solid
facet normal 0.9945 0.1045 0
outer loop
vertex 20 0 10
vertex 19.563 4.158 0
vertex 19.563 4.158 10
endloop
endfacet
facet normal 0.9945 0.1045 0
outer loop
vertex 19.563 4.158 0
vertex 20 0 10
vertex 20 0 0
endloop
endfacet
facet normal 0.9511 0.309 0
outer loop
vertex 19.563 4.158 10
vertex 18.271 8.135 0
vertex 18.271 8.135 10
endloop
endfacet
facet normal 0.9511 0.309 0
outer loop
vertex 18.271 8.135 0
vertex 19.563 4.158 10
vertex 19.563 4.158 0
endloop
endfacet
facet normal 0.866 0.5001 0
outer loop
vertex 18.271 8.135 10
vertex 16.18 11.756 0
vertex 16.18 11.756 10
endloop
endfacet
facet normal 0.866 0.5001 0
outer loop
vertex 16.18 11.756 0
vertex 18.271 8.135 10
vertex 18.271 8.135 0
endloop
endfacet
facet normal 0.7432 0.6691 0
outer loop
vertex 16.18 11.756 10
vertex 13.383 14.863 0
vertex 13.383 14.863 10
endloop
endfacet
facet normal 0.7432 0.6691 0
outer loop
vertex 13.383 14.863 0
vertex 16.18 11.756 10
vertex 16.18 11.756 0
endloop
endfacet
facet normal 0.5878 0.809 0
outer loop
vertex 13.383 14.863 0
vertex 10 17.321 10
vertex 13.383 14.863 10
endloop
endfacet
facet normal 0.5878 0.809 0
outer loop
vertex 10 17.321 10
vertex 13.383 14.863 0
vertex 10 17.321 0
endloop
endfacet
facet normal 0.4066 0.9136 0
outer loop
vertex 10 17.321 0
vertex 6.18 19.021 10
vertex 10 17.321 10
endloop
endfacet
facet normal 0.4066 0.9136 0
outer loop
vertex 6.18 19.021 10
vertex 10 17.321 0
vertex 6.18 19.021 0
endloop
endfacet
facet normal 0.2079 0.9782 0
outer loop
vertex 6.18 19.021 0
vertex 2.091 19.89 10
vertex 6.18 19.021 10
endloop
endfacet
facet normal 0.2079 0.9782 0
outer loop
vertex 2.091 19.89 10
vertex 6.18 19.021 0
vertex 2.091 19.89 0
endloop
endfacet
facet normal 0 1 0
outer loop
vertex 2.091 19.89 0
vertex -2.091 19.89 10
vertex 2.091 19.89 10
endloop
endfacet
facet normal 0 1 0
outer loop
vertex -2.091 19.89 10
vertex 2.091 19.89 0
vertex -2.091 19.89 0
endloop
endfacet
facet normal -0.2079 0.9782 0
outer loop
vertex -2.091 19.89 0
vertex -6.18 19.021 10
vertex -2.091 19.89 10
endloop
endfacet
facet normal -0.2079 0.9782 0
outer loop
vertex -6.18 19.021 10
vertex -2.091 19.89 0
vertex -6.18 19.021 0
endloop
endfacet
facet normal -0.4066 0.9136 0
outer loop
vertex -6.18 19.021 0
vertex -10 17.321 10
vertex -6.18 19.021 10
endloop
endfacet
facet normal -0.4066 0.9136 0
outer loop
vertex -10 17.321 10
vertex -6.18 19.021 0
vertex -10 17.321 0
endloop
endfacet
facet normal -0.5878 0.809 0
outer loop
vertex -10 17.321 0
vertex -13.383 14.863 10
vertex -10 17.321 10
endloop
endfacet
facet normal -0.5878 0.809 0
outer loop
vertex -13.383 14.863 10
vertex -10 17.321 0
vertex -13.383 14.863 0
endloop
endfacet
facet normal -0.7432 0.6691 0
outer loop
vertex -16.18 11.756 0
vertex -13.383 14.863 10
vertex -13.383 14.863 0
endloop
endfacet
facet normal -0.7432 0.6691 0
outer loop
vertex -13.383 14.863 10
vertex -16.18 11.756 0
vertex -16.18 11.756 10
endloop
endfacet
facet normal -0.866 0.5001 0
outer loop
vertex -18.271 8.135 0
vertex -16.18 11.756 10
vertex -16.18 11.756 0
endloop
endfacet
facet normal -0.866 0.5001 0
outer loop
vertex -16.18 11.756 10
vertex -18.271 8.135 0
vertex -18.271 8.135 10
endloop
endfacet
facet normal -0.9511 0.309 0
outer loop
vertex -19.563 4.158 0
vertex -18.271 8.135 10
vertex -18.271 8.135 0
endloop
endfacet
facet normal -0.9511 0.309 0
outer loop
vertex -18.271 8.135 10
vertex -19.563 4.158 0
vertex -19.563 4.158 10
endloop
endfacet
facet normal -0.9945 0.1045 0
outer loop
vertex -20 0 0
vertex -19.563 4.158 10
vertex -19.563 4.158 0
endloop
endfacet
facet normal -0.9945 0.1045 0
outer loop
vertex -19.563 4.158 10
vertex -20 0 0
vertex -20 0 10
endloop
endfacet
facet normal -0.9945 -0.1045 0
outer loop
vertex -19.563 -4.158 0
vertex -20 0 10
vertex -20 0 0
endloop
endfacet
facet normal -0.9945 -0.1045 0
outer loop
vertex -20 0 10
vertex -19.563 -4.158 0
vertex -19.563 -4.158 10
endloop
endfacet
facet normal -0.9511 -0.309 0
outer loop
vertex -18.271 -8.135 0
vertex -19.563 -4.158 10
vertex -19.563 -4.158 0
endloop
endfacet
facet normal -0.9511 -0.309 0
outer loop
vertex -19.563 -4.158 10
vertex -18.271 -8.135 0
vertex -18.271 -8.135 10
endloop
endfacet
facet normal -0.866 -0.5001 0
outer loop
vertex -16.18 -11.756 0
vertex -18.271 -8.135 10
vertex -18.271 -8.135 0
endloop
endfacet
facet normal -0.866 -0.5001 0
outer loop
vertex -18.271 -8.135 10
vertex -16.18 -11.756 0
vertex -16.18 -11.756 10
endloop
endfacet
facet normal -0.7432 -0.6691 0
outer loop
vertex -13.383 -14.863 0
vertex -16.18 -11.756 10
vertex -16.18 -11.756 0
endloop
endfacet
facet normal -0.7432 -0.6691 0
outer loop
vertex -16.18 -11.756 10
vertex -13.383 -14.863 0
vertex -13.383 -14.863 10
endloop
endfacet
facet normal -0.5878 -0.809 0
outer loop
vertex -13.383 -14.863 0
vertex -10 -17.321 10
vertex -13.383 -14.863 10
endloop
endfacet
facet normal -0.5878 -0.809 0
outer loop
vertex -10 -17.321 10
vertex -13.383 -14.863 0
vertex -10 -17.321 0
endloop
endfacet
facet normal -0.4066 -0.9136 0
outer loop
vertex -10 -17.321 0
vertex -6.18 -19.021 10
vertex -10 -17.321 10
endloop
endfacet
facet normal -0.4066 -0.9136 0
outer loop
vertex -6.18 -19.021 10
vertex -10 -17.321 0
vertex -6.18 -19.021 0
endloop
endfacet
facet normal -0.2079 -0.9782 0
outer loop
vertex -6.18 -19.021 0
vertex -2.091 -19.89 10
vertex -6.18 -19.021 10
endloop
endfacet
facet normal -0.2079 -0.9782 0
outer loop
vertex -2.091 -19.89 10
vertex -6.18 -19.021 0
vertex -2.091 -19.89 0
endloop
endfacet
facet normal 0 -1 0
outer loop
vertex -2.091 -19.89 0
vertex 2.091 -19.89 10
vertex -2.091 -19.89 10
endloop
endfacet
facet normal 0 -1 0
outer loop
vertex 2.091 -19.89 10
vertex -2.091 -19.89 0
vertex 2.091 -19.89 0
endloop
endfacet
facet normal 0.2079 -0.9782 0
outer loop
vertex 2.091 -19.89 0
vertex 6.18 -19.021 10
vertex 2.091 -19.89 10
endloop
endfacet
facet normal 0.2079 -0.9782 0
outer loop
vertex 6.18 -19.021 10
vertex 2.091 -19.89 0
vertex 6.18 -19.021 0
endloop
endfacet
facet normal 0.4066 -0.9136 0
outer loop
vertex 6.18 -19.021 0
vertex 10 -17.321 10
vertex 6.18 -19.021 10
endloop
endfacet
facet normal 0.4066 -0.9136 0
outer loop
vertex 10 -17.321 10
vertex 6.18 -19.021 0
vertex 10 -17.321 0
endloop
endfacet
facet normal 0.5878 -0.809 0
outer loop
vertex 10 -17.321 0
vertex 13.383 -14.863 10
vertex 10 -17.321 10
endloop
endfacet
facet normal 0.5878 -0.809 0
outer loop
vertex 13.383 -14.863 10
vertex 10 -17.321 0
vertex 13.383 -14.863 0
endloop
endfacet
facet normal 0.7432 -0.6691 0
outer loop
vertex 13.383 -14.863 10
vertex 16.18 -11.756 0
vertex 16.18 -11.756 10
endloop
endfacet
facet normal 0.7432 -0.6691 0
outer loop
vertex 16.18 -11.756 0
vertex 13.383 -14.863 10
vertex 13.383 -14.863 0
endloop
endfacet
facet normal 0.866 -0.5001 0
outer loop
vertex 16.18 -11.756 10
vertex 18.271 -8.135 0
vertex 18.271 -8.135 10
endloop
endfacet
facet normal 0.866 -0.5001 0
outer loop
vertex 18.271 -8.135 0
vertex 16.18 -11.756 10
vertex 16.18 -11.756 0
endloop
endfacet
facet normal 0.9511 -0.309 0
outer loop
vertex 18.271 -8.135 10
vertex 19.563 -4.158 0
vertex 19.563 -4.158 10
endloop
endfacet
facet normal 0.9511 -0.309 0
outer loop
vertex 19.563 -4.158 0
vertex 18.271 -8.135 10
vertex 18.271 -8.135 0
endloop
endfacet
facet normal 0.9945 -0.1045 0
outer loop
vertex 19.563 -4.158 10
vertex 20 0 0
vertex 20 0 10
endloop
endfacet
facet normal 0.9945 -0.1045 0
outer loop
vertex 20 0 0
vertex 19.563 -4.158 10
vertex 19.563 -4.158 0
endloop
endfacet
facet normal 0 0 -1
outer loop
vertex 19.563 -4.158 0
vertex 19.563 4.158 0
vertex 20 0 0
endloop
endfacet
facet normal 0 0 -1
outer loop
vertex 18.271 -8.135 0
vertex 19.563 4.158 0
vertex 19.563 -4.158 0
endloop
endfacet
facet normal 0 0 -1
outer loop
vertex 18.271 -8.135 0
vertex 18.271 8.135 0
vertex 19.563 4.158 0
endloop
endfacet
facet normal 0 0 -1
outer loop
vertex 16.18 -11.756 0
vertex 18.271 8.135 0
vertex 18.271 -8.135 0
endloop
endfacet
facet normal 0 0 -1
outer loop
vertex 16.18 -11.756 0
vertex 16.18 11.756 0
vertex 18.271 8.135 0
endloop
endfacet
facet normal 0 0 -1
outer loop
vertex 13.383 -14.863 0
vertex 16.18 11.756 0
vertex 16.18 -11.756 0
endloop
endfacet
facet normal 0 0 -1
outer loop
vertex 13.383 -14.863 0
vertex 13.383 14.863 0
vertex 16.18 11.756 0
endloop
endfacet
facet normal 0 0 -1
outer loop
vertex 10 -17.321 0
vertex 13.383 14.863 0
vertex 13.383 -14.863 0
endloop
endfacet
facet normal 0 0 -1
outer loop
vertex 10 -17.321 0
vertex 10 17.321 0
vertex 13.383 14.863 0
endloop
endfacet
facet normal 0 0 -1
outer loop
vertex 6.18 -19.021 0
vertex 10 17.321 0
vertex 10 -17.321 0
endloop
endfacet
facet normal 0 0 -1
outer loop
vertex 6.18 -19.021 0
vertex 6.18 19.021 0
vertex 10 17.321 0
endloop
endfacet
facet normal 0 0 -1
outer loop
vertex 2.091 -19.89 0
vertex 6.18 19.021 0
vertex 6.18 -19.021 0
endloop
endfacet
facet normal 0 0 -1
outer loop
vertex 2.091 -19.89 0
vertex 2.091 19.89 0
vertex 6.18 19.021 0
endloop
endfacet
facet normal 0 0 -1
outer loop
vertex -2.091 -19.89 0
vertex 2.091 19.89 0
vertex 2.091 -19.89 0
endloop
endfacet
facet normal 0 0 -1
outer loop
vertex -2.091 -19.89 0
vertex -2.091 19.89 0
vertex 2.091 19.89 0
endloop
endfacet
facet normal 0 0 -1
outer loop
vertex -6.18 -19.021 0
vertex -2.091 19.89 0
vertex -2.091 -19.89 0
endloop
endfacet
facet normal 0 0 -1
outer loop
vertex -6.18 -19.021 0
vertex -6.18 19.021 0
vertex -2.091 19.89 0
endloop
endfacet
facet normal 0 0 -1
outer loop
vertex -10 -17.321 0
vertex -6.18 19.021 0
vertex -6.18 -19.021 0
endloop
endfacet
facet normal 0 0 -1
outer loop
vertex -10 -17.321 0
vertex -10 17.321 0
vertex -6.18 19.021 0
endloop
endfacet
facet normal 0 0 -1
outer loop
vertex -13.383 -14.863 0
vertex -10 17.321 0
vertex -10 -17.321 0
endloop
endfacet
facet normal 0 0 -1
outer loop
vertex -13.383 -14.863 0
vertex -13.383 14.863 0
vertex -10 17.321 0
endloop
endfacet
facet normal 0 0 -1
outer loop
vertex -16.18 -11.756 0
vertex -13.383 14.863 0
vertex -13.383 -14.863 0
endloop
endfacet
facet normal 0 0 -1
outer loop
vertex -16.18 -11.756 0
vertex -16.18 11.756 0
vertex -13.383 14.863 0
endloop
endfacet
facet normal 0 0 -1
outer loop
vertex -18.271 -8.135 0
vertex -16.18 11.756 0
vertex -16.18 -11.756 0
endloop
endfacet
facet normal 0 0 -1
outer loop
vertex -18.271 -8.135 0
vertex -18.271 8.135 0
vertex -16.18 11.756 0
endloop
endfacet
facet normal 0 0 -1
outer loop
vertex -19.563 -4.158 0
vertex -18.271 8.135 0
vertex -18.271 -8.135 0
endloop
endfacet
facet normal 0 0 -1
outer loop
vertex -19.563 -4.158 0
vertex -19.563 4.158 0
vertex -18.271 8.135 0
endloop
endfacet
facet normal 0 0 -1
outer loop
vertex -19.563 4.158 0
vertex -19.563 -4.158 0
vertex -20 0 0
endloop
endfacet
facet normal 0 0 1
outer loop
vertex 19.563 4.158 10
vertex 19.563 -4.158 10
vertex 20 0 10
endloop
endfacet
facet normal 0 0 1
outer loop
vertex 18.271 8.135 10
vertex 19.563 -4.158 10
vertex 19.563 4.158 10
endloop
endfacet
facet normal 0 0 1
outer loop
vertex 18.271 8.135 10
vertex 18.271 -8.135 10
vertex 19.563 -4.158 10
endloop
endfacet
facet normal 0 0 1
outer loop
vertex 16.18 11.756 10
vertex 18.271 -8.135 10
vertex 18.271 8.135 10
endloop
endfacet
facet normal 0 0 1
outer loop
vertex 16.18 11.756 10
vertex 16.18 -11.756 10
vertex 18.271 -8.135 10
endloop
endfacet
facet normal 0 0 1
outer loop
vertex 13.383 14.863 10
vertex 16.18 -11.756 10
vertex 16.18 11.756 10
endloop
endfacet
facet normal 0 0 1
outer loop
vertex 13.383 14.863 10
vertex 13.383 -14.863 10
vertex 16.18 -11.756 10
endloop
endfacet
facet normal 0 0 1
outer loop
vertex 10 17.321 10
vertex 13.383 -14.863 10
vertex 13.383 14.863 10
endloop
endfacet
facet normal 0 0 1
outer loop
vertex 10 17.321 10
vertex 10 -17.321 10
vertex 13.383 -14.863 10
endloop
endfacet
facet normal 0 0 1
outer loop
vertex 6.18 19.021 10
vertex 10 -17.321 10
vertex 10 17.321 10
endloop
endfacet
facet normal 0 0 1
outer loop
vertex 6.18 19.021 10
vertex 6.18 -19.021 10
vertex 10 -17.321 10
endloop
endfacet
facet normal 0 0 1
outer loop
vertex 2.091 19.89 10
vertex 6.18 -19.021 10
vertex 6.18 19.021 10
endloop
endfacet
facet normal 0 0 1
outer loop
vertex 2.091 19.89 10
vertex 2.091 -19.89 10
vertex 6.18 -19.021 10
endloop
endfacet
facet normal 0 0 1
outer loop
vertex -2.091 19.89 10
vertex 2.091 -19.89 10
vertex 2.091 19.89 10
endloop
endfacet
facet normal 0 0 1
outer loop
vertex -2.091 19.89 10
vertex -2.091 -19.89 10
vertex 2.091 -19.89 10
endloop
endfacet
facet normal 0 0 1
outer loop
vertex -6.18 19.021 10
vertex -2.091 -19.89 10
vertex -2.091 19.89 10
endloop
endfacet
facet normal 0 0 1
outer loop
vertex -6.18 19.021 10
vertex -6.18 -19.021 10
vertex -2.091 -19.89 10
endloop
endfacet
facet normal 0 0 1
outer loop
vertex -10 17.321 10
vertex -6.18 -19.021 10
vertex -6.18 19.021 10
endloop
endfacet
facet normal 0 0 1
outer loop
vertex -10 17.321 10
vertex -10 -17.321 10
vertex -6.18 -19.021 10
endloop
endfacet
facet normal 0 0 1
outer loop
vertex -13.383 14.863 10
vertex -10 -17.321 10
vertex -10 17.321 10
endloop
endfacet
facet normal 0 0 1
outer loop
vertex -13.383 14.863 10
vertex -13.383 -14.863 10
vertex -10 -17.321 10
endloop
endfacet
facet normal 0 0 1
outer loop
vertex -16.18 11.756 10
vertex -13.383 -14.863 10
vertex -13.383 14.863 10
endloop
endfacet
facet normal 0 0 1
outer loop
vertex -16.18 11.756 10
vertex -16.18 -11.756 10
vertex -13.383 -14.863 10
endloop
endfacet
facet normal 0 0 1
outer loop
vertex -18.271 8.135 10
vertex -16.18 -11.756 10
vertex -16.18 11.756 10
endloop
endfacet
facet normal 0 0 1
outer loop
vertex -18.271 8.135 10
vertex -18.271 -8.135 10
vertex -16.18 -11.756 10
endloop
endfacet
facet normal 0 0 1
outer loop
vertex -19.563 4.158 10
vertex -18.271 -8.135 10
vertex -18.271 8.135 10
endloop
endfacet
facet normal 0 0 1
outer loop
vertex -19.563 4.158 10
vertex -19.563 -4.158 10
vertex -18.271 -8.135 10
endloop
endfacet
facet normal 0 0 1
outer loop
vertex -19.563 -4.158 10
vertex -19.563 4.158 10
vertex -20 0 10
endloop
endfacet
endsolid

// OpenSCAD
//eight optional sockets from a common center
//subtract all other socket_ID and opposite half of socket_OD
//
//L length from center
//OD outside diameter of socket wall
//ID inside diamter of socket wall
//X angle from verticle front
//Y angle from verticle right

socket1_L = 0;
socket1_OD = 0;
socket1_ID = 0;
socket1_X = 0;
socket1_Y = 0;
socket2_L = 0;
socket2_OD = 0;
socket2_ID = 0;
socket2_X = 0;
socket2_Y = 0;
socket3_L = 0;
socket3_OD = 0;
socket3_ID = 0;
socket3_X = 0;
socket3_Y = 0;
socket4_L = 0;
socket4_OD = 0;
socket4_ID = 0;
socket4_X = 0;
socket4_Y = 0;
socket5_L = 0;
socket5_OD = 0;
socket5_ID = 0;
socket5_X = 0;
socket5_Y = 0;
socket6_L = 0;
socket6_OD = 0;
socket6_ID = 0;
socket6_X = 0;
socket6_Y = 0;
socket7_L = 0;
socket7_OD = 0;
socket7_ID = 0;
socket7_X = 0;
socket7_Y = 0;
socket8_L = 0;
socket8_OD = 0;
socket8_ID = 0;
socket8_X = 0;
socket8_Y = 0;

cylinder(h = 10, r=20);
